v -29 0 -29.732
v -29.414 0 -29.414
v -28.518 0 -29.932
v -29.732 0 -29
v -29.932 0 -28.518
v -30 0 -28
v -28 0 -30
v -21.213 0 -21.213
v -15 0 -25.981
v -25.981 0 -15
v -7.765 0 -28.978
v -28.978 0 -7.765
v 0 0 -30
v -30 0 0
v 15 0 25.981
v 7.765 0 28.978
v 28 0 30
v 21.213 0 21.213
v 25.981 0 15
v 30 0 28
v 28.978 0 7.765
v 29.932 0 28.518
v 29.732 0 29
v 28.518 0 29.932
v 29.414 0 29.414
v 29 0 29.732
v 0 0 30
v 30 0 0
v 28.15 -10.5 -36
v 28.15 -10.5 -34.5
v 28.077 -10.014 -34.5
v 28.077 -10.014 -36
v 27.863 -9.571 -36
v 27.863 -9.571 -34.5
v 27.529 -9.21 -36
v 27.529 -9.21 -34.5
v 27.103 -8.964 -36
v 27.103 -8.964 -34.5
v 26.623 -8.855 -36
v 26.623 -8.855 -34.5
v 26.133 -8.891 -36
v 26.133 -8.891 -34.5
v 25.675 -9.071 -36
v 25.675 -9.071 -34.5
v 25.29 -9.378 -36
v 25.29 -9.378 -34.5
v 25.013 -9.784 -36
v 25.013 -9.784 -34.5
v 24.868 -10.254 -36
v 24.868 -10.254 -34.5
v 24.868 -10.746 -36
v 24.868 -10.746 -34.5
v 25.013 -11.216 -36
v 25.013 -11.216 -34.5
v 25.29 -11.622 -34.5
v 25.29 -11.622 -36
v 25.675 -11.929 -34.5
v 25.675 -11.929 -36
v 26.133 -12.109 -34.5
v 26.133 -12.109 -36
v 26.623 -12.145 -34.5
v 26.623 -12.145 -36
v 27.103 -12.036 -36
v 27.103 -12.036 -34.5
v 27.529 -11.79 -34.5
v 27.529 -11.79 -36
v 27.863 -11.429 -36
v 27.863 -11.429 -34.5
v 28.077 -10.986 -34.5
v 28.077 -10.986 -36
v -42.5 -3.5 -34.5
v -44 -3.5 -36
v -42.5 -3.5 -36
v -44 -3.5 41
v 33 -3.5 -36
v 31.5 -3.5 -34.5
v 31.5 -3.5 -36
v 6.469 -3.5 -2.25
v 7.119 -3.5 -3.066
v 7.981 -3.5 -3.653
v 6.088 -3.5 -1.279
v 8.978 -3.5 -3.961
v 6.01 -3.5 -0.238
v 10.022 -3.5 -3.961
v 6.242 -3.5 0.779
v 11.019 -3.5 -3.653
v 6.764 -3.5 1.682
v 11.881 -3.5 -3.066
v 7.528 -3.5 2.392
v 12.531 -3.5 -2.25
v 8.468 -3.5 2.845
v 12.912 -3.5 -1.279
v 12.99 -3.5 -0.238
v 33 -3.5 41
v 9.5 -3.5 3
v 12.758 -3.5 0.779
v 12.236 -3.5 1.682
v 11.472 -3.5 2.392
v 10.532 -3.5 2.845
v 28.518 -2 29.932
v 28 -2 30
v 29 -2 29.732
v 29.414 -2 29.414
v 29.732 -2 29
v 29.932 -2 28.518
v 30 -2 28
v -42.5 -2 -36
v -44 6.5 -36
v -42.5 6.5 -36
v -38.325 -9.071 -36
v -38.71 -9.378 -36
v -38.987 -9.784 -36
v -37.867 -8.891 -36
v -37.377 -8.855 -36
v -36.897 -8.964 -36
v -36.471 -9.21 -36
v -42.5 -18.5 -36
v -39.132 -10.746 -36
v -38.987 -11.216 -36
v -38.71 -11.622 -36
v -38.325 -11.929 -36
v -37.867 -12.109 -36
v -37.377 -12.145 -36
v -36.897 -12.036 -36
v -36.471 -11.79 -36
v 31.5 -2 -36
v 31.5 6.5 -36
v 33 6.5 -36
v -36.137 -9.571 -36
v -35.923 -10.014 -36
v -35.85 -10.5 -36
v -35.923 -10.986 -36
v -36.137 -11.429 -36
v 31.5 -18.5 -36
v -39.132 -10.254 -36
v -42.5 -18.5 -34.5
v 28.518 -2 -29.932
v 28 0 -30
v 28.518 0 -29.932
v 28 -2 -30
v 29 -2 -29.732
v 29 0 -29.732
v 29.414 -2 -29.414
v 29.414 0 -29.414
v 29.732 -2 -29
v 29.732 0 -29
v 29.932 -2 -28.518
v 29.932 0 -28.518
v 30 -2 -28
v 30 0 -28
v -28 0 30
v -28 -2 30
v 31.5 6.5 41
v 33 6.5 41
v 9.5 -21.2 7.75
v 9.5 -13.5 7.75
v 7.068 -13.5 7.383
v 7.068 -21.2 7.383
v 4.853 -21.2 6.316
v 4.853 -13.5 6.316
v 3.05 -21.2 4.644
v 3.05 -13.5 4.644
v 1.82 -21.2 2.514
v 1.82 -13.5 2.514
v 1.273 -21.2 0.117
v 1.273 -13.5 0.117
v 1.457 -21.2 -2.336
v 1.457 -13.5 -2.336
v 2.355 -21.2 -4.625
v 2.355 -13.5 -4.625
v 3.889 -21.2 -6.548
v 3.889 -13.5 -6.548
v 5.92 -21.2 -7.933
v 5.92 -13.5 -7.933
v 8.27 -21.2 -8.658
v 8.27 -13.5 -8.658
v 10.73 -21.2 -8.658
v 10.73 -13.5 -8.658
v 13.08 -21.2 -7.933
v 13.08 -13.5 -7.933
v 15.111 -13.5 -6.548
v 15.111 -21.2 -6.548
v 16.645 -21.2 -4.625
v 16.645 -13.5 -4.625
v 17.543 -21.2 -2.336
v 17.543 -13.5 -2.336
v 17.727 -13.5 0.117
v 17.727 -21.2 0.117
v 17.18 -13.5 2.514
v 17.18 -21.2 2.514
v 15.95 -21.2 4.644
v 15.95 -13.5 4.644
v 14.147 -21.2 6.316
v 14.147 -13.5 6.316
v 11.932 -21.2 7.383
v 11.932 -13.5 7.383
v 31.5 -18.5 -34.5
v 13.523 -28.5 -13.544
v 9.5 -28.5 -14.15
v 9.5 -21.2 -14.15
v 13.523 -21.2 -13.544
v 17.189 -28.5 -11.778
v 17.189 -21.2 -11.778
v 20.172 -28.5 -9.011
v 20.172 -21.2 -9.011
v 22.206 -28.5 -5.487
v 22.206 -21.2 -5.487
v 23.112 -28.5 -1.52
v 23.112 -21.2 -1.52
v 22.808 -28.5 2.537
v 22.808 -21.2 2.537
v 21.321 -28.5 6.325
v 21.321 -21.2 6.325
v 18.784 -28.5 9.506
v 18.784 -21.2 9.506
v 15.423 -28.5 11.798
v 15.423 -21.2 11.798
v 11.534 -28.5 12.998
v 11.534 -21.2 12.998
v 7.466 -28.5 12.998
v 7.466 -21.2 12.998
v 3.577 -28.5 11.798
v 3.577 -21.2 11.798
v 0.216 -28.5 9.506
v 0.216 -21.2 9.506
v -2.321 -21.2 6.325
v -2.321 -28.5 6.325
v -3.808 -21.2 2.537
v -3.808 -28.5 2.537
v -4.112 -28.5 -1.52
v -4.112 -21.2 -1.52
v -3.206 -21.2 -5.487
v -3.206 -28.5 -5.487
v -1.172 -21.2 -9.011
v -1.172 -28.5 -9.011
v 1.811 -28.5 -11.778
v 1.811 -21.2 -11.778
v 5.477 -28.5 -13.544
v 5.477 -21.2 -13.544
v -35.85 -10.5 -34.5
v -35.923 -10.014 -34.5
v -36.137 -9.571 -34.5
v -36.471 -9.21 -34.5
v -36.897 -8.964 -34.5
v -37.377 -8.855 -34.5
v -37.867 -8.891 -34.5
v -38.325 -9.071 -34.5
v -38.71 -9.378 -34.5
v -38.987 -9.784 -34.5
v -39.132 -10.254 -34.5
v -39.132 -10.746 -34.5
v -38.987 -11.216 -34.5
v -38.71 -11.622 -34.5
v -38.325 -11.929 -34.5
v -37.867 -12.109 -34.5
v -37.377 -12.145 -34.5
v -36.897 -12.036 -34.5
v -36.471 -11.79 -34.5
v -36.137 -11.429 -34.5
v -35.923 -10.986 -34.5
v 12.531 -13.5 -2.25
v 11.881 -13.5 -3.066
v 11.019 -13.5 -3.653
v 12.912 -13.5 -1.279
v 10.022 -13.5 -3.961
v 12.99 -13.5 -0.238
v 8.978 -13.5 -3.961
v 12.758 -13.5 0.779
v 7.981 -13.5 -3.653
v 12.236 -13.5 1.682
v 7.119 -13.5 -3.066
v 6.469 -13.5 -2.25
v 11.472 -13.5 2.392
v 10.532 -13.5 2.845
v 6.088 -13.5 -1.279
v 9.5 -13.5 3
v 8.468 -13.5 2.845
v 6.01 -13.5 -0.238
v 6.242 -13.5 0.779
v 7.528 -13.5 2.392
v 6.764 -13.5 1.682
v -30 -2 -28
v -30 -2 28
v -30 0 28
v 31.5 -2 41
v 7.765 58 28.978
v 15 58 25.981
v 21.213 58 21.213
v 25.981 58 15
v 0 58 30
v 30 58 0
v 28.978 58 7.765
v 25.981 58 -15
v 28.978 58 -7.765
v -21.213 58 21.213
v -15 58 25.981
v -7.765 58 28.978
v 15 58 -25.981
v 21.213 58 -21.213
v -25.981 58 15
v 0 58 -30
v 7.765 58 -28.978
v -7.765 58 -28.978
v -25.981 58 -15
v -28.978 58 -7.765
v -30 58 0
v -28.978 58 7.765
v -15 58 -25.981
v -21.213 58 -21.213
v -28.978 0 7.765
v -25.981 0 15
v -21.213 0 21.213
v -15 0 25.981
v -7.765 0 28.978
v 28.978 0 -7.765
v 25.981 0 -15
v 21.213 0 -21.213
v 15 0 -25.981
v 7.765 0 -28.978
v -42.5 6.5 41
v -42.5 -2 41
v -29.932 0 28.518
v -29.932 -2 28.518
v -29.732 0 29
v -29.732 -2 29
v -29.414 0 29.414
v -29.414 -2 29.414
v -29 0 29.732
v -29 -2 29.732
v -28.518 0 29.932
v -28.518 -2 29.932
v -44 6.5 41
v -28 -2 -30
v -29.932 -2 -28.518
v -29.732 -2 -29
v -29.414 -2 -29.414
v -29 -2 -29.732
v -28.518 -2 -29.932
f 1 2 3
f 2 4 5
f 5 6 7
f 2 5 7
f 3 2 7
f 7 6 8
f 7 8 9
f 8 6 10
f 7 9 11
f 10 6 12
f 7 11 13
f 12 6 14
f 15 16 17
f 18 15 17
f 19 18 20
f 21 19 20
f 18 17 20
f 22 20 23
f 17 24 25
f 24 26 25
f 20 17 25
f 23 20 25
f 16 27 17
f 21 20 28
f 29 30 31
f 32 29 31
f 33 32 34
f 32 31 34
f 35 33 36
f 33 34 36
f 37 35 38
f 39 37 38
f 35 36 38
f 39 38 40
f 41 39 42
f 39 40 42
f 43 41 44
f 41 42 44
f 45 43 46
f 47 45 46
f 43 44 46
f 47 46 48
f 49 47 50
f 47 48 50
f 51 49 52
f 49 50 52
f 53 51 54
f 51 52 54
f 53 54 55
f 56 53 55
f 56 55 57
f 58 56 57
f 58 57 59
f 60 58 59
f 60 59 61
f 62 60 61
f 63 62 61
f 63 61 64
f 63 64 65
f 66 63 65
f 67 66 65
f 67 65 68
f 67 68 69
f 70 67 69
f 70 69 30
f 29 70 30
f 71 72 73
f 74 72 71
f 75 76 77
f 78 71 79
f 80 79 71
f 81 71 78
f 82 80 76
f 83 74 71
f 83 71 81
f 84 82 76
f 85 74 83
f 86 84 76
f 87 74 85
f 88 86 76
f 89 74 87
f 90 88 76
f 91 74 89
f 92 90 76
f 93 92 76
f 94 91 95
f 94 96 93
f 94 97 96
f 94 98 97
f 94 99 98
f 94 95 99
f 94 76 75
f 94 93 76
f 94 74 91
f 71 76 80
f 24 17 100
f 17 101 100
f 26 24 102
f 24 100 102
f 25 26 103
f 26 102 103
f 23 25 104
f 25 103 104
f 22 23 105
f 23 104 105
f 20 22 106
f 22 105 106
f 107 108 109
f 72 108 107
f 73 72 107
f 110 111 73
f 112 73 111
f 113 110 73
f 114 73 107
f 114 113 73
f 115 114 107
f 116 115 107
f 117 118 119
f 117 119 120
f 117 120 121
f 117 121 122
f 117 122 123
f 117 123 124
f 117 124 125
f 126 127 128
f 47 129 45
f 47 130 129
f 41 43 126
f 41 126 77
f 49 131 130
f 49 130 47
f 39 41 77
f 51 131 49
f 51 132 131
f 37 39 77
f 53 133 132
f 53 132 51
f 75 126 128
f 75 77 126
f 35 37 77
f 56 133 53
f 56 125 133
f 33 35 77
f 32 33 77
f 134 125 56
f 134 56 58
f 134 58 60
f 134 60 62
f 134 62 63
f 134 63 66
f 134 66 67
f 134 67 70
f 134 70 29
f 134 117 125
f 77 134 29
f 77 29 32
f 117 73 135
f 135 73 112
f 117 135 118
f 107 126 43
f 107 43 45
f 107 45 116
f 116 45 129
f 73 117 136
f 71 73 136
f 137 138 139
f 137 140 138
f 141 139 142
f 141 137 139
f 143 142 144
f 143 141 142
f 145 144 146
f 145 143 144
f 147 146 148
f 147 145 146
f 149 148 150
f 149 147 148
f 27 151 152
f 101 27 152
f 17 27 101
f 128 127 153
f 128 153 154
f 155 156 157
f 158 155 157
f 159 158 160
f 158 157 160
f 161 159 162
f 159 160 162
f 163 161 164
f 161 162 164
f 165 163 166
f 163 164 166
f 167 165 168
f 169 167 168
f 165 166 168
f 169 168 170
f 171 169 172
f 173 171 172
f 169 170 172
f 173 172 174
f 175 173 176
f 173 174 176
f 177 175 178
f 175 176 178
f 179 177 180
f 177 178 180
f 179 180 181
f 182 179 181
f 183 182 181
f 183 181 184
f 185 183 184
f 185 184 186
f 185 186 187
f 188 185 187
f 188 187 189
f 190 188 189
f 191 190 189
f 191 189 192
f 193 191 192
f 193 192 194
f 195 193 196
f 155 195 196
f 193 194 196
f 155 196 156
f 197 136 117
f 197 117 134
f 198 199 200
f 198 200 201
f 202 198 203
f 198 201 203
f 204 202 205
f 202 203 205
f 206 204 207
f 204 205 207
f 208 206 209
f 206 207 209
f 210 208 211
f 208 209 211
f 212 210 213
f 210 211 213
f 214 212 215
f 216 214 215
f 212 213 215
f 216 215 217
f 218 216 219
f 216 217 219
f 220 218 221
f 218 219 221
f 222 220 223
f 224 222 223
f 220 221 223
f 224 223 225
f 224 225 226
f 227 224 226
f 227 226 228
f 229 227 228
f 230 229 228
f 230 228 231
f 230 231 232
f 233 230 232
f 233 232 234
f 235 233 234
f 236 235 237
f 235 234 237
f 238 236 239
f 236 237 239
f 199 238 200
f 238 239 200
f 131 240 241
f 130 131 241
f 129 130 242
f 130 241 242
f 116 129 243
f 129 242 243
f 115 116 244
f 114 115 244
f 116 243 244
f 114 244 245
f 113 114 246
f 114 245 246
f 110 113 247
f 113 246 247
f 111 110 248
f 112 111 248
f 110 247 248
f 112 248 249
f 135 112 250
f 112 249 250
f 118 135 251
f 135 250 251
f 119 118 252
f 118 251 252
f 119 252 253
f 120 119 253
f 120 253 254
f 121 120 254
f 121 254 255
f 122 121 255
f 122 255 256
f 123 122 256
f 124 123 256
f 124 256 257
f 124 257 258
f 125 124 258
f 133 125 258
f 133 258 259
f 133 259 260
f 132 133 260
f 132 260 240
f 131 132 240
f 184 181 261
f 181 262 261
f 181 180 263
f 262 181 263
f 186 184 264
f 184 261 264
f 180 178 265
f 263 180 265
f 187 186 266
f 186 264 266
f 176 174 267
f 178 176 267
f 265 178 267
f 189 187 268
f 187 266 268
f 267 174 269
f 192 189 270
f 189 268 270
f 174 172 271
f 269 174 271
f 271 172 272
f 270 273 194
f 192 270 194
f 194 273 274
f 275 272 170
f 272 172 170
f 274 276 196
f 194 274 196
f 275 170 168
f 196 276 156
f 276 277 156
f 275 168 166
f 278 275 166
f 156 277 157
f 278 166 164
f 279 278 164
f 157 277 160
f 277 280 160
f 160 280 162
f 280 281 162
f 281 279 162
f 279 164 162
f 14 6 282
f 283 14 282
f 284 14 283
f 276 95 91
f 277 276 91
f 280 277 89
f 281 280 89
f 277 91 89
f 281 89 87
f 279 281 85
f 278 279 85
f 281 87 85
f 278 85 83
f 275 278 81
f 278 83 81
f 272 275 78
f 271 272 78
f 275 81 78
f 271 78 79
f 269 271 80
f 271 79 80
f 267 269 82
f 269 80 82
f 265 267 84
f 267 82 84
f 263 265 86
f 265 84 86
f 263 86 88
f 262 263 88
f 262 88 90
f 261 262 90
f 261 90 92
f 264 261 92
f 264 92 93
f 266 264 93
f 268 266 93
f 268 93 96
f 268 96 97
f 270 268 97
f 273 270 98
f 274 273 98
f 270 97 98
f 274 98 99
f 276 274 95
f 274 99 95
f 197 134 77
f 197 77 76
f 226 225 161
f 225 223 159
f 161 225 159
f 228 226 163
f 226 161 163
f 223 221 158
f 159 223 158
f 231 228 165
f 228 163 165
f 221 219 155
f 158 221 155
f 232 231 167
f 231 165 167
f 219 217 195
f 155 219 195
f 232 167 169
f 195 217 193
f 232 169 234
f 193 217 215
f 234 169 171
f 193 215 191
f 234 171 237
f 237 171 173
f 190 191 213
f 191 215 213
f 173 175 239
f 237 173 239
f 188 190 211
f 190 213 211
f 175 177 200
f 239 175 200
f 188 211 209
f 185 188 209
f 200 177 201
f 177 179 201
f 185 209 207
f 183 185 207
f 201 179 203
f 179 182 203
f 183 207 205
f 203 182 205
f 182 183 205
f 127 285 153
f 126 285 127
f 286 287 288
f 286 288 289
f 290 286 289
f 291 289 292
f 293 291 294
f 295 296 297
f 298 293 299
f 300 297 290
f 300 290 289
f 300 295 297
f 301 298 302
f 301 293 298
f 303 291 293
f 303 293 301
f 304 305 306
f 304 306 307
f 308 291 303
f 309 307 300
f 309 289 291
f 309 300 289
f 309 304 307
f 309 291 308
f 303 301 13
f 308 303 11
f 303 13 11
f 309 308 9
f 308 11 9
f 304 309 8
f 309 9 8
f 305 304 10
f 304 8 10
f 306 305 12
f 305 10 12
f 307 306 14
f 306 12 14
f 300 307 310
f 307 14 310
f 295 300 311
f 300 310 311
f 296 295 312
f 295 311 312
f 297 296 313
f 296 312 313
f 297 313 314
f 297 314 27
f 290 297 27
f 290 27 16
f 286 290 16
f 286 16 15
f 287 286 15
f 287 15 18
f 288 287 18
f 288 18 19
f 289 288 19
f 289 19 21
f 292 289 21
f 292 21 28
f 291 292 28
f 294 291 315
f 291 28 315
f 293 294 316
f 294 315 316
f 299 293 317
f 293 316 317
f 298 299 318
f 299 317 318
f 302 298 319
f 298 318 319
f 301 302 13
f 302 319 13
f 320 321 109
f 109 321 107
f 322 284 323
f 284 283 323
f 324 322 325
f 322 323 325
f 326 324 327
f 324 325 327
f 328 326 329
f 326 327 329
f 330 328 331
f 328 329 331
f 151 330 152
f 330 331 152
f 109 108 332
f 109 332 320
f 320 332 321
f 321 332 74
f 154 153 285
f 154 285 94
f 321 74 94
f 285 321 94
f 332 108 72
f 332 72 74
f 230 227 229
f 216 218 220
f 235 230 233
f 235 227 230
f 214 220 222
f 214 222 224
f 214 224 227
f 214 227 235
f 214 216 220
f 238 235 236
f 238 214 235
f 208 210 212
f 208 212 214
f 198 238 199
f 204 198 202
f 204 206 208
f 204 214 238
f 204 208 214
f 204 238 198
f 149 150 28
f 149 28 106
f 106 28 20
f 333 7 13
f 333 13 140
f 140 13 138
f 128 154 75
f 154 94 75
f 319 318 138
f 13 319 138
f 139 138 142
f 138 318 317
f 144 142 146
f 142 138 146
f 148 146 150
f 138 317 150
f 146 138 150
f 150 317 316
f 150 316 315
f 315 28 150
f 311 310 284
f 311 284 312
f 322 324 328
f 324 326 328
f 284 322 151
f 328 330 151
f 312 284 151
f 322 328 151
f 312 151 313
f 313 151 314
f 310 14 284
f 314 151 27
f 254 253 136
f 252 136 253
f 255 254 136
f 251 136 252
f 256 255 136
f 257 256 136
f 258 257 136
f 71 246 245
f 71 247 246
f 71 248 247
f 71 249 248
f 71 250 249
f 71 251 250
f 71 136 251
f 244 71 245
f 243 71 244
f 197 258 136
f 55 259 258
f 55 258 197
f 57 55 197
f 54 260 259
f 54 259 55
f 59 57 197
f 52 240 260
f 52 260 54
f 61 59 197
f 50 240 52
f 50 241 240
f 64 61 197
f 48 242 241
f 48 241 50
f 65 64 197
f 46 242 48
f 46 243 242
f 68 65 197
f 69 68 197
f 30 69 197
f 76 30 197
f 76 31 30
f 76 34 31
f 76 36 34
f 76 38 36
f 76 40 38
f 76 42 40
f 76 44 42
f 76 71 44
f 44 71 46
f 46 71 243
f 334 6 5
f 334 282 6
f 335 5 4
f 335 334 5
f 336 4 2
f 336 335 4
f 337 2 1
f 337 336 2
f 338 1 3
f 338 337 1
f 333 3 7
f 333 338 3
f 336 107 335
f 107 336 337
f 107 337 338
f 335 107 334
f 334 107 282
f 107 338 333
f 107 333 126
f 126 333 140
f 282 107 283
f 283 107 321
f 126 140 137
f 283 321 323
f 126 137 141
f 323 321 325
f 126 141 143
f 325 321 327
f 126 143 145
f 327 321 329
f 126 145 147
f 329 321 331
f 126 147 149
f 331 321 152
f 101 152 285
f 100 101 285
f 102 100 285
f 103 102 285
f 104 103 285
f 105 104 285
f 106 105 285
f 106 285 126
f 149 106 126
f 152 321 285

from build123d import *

# Parameters (mm, degrees)
SKETCH_1_R        = 30
EXTRUDE_1_DEPTH   = 58
SKETCH_2_W        = 60
SKETCH_2_H        = 60
EXTRUDE_2_DEPTH   = 2
FILLET_1_R        = 2
SKETCH_3_W        = 77
SKETCH_3_H        = 77
EXTRUDE_3_DEPTH   = 1.5
SKETCH_4_W        = 1.5
SKETCH_4_H        = 77
EXTRUDE_4_DEPTH   = 8.5
SKETCH_5_W        = 74
SKETCH_5_H        = 1.5
EXTRUDE_5_DEPTH   = 15
SKETCH_6_R        = 3.5
EXTRUDE_6_DEPTH   = 10
SKETCH_7_R        = 8.25
EXTRUDE_7_DEPTH   = 7.7
SKETCH_8_R        = 13.65
EXTRUDE_8_DEPTH   = 7.3
HOLE_WIZARD_M41_D = 3.3


with BuildPart() as part:
    # Эскиз1 → Бобышка-Вытянуть1 (new body)
    with BuildSketch(Plane(origin=(0, 0, 0), x_dir=(1, 0, 0), z_dir=(0, 1, 0))):
        with Locations(Location((0, 0, 0), (0, 0, 90))):
            Circle(SKETCH_1_R)
    extrude(amount=EXTRUDE_1_DEPTH)

    # Эскиз2 → Бобышка-Вытянуть2 (add)
    with BuildSketch(Plane.XZ):
        Rectangle(SKETCH_2_W, SKETCH_2_H)
    extrude(amount=EXTRUDE_2_DEPTH)

    # Скругление1
    fillet_1_edges = [part.edges().sort_by_distance(p)[0] for p in [
        (30, -1, -30),
        (30, -1, 30),
        (-30, -1, 30),
        (-30, -1, -30),
    ]]
    fillet(fillet_1_edges, radius=FILLET_1_R)

    # Эскиз3 → Бобышка-Вытянуть3 (add)
    with BuildSketch(Plane.XZ.offset(2)):
        with Locations((-5.5, 2.5)):
            Rectangle(SKETCH_3_W, SKETCH_3_H)
    extrude(amount=EXTRUDE_3_DEPTH)

    # Эскиз4 → Бобышка-Вытянуть4 (add)
    with BuildSketch(Plane(origin=(0, -2, 0), x_dir=(1, 0, 0), z_dir=(0, 1, 0))):
        with Locations((32.25, -2.5)):
            Rectangle(SKETCH_4_W, SKETCH_4_H)
        with Locations((-43.25, -2.5)):
            Rectangle(SKETCH_4_W, SKETCH_4_H)
    extrude(amount=EXTRUDE_4_DEPTH)

    # Эскиз5 → Бобышка-Вытянуть5 (add)
    with BuildSketch(Plane.XZ.offset(3.5)):
        with Locations((-5.5, -35.25)):
            Rectangle(SKETCH_5_W, SKETCH_5_H)
    extrude(amount=EXTRUDE_5_DEPTH)

    # Эскиз6 → Бобышка-Вытянуть6 (add)
    with BuildSketch(Plane.XZ.offset(3.5)):
        with Locations(Location((9.5, -0.5, 0), (0, 0, 90))):
            Circle(SKETCH_6_R)
    extrude(amount=EXTRUDE_6_DEPTH)

    # Эскиз7 → Бобышка-Вытянуть7 (add)
    with BuildSketch(Plane.XZ.offset(13.5)):
        with Locations(Location((9.5, -0.5, 0), (0, 0, 90))):
            Circle(SKETCH_7_R)
    extrude(amount=EXTRUDE_7_DEPTH)

    # Эскиз8 → Бобышка-Вытянуть8 (add)
    with BuildSketch(Plane.XZ.offset(21.2)):
        with Locations(Location((9.5, -0.5, 0), (0, 0, 270))):
            Circle(SKETCH_8_R)
    extrude(amount=EXTRUDE_8_DEPTH)

    # Отверстие обработанное метчиком M41 (through all)
    with Locations(Plane(origin=(0, 0, -36), x_dir=(-1, 0, 0), z_dir=(0, 0, -1))):
        with Locations((37.5, -10.5), (-26.5, -10.5)):
            Hole(HOLE_WIZARD_M41_D / 2)


solid = part.part
